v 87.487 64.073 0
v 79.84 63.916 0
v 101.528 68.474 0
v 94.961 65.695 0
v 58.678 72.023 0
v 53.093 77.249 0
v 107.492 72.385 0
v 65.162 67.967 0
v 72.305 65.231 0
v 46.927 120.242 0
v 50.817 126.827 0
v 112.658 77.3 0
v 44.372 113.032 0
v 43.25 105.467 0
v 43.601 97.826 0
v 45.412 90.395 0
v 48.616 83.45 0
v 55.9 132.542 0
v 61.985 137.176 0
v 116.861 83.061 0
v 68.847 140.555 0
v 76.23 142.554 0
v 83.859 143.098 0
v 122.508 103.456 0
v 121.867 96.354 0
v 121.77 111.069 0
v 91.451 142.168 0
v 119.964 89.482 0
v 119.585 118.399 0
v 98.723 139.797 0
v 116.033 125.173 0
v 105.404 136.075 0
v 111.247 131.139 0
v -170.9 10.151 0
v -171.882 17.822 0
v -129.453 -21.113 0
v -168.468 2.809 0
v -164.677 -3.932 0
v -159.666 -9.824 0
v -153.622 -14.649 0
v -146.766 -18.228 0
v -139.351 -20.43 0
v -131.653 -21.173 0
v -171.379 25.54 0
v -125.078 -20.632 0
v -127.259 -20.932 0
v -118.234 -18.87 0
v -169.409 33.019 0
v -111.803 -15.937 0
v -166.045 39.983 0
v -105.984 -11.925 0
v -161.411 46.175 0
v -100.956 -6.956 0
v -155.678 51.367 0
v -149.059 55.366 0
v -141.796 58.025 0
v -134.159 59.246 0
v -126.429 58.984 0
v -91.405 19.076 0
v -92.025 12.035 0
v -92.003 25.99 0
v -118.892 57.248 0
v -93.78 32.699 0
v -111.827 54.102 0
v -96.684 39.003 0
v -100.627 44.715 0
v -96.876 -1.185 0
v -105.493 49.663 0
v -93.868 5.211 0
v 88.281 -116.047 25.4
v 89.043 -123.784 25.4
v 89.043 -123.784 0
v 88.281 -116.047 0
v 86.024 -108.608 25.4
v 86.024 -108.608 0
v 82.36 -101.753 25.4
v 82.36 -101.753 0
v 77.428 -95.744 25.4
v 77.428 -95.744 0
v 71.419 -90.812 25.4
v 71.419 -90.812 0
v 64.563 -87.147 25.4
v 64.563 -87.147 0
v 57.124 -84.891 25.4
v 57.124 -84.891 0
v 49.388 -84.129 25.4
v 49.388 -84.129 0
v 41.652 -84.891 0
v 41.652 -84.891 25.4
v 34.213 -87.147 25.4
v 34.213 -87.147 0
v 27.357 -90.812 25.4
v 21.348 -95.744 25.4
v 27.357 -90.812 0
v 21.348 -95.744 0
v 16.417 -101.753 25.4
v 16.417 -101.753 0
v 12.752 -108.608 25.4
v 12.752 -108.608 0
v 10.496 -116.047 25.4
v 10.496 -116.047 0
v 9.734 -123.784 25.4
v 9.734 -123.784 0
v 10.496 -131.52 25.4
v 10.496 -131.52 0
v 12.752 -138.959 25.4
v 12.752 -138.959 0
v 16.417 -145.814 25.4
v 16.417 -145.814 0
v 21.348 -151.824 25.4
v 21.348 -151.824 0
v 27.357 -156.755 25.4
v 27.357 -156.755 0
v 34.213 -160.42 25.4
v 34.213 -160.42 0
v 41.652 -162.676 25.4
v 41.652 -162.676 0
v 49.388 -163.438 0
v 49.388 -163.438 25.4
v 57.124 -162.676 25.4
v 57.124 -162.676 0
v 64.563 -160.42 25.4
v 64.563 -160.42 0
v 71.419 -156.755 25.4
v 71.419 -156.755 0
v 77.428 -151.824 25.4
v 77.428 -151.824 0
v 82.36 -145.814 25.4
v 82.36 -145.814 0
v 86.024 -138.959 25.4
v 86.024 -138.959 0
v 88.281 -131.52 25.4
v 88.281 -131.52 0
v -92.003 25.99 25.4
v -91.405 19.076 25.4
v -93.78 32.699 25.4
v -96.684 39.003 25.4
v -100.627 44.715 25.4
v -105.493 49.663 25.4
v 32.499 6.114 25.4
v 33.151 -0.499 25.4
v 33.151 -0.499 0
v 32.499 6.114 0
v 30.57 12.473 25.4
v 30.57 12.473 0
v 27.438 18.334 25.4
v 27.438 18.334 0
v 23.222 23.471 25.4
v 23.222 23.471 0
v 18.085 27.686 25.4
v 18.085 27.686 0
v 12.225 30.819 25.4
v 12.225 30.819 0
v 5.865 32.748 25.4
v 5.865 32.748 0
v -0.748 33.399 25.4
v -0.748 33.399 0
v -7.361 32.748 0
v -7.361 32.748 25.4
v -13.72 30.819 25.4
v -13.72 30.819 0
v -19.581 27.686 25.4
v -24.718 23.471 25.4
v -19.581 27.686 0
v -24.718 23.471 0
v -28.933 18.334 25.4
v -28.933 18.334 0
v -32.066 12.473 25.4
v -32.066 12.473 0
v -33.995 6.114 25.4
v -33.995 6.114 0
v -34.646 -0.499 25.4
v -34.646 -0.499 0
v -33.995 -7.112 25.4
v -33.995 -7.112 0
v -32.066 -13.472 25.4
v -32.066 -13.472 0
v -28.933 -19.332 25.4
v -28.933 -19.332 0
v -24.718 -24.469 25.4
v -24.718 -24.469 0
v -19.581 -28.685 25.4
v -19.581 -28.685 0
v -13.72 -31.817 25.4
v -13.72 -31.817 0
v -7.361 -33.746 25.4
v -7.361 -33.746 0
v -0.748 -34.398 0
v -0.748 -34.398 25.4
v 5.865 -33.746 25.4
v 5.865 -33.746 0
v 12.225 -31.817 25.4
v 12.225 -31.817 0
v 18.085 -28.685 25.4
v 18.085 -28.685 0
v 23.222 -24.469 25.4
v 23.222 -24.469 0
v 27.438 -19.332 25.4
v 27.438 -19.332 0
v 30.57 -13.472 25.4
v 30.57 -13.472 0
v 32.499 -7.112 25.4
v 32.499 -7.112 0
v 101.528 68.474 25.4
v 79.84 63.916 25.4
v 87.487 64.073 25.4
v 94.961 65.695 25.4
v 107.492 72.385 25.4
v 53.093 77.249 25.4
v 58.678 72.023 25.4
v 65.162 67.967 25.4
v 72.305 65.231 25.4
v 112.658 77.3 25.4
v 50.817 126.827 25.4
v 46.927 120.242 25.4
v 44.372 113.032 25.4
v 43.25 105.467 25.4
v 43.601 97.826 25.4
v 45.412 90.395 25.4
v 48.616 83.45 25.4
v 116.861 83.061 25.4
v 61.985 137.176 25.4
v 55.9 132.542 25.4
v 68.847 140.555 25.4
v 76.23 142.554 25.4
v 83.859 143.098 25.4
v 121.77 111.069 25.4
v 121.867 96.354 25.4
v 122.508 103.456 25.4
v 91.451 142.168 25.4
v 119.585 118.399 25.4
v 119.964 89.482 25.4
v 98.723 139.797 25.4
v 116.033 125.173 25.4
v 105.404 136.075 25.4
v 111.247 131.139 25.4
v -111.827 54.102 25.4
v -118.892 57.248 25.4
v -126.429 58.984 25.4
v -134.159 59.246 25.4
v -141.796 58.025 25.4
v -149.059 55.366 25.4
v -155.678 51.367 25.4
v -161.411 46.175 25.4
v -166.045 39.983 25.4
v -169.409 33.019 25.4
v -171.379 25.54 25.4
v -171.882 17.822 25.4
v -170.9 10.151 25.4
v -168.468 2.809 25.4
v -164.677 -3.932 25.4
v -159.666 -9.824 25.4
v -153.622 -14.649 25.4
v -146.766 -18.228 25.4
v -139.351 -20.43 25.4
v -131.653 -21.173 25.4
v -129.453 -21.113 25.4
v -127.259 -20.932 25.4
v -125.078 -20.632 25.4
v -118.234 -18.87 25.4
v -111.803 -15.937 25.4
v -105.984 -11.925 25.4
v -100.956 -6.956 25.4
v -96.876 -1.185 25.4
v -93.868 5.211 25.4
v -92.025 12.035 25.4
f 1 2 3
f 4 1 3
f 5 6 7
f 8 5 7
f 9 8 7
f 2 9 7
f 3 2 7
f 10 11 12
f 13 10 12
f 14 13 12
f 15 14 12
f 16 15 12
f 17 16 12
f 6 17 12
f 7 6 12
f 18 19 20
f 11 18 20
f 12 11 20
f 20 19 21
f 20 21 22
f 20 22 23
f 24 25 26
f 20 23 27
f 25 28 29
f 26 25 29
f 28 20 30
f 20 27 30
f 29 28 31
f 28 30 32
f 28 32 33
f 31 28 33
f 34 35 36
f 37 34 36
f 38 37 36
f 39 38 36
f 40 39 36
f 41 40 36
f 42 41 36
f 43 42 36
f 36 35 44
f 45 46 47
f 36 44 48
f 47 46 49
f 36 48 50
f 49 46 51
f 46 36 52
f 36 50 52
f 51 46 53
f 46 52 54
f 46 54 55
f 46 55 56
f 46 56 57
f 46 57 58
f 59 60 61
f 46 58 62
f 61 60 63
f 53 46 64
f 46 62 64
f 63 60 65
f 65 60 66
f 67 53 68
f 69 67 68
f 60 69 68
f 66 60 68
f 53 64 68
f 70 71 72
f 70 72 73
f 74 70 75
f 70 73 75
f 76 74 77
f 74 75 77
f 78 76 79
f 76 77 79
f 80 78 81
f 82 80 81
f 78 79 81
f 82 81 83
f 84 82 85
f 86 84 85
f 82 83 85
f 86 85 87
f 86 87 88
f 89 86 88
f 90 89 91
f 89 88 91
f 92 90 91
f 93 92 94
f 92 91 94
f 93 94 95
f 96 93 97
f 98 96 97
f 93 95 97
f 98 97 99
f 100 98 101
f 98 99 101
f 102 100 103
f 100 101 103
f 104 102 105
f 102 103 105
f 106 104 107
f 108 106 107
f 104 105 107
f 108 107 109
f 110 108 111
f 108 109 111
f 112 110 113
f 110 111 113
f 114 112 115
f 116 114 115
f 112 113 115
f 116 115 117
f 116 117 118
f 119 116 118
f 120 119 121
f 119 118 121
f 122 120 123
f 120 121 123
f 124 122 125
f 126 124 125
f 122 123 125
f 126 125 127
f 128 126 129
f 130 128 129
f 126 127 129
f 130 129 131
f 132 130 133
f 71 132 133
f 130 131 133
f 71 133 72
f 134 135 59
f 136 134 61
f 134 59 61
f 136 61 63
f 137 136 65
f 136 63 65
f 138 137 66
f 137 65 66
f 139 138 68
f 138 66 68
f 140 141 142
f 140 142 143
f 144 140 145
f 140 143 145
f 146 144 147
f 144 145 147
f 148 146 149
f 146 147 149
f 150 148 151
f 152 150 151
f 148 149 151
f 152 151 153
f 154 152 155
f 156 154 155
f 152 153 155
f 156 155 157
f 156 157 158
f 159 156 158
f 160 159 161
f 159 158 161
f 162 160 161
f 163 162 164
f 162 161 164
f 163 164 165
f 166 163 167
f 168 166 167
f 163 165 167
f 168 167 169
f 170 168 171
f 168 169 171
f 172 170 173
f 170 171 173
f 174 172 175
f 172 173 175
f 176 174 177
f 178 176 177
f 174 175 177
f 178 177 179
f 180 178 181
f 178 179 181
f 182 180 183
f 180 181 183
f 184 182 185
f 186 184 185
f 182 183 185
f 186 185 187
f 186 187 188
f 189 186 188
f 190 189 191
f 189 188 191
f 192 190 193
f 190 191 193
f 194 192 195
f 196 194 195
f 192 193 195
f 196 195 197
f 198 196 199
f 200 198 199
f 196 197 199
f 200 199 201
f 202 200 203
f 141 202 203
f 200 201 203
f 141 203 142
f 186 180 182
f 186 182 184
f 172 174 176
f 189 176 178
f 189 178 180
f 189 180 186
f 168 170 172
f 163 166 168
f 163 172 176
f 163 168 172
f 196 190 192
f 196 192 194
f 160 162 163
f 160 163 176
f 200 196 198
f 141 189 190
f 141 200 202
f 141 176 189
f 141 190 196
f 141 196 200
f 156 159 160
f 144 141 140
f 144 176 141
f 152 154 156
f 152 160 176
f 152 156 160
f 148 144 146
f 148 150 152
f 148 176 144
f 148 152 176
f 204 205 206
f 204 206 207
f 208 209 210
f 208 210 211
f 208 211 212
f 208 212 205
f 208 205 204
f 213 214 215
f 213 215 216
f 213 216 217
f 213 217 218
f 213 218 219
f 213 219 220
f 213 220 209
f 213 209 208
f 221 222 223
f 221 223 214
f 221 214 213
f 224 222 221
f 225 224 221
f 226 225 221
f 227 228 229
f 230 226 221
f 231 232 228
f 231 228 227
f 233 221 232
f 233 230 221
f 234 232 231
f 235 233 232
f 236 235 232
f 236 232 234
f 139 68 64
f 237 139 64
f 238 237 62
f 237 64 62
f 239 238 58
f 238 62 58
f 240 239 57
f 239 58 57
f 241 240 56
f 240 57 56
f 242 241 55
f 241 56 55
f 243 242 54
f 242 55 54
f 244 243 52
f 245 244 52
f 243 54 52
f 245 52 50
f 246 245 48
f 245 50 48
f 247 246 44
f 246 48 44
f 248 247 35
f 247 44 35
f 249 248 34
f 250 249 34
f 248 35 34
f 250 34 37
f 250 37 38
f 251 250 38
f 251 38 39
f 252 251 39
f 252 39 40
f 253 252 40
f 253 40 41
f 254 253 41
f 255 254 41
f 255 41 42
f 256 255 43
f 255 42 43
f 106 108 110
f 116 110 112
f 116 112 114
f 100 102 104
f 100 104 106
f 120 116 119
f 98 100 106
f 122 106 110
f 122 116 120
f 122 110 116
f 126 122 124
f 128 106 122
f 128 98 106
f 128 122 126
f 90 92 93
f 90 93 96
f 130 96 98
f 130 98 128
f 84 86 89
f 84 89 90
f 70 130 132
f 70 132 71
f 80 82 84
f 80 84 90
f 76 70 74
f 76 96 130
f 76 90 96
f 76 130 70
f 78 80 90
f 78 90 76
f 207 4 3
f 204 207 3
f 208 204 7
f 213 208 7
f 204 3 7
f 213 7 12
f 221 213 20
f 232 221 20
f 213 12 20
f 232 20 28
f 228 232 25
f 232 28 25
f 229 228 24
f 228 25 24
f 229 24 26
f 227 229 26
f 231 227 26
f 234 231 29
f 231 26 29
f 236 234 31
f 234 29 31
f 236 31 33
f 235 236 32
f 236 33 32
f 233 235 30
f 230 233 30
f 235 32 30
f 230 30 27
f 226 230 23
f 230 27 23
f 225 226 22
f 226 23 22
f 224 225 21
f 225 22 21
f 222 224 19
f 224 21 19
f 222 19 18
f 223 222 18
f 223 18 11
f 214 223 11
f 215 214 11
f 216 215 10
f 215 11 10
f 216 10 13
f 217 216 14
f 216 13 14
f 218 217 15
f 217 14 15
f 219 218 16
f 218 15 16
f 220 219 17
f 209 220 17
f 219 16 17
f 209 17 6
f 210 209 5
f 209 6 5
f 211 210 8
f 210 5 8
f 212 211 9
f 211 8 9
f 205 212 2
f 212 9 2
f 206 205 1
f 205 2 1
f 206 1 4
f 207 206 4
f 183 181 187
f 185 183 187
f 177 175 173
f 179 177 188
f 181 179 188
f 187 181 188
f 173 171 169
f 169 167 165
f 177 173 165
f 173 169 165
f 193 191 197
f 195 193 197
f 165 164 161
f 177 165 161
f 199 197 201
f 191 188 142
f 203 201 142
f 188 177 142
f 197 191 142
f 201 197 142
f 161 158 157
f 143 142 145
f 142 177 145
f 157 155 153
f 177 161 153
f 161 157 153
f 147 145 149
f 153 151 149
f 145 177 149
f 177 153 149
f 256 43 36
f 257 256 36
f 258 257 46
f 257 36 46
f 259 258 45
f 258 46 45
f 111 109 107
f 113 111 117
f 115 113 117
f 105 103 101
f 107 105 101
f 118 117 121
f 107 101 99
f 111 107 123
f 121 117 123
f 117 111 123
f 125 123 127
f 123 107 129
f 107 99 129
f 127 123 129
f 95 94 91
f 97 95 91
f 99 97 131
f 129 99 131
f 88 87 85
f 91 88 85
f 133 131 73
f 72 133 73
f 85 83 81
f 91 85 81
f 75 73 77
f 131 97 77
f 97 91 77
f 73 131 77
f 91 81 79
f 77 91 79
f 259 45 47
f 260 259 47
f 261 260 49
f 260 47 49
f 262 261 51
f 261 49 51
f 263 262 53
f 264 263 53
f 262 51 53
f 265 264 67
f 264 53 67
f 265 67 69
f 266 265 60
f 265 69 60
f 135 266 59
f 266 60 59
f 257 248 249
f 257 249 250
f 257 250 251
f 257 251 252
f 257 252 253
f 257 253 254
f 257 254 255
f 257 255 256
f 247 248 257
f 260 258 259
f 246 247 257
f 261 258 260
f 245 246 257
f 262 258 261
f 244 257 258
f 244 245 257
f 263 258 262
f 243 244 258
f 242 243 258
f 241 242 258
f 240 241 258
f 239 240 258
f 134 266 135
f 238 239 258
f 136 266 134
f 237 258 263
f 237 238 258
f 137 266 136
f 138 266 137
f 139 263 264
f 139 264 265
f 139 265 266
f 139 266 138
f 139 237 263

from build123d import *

# Parameters (mm, degrees)
F0_R     = 33.3045819347
F1_DEPTH = 25.4
F0_R_2   = 33.8985173745


with BuildPart() as f1:
    # F0 (on Top) → F1 (new body)
    with BuildSketch(Plane.XY):
        with BuildLine():
            ThreePointArc((10.1881658678, -117.7966108428), (46.3861106689, -163.3243326291), (89.0427784966, -123.7835517983))
            ThreePointArc((89.0427784966, -123.7835517983), (52.3902824548, -84.2427709675), (10.1881658678, -117.7966108428))
        make_face()
        with Locations((49.3881965618, -123.7835517983)):
            Circle(F0_R, mode=Mode.SUBTRACT)
        with Locations((49.3881965618, -123.7835517983)):
            Circle(F0_R)
    extrude(amount=F1_DEPTH)


with BuildPart() as f1b:
    # F0 (on Top) → F1, piece 2 (new body)
    with BuildSketch(Plane.XY):
        with BuildLine():
            ThreePointArc((94.9610891571, 65.6953507789), (114.8894087237, 80.085805582), (122.5079874693, 103.4563076751))
            ThreePointArc((122.5079874693, 103.4563076751), (50.8174023454, 126.8268097682), (94.9610891571, 65.6953507789))
        make_face()
        with Locations((82.8534055346, 103.4563076751)):
            Circle(F0_R, mode=Mode.SUBTRACT)
        with Locations((82.8534055346, 103.4563076751)):
            Circle(F0_R)
    extrude(amount=F1_DEPTH)


with BuildPart() as f1c:
    # F0 (on Top) → F1, piece 3 (new body)
    with BuildSketch(Plane.XY):
        with BuildLine():
            ThreePointArc((-131.653085351, -21.1727726474), (-128.3691135331, -20.8615140587), (-125.0784078119, -20.6321482679))
            ThreePointArc((-125.0784078119, -20.6321482679), (-100.9564717429, -6.9561792095), (-91.4045679764, 19.0757447272))
            ThreePointArc((-91.4045679764, 19.0757447272), (-95.0960352936, 35.9139525283), (-105.4932977209, 49.6634654987))
            ThreePointArc((-105.4932977209, 49.6634654987), (-169.4092342659, 33.0190718037), (-131.653085351, -21.1727726474))
        make_face()
        with Locations((-131.653085351, 19.0757447272)):
            Circle(F0_R_2, mode=Mode.SUBTRACT)
        with Locations((-131.653085351, 19.0757447272)):
            Circle(F0_R_2)
        with BuildLine():
            ThreePointArc((-131.653085351, -21.1727726474), (-128.3546516521, -21.0373888575), (-125.0784078119, -20.6321482679))
            ThreePointArc((-125.0784078119, -20.6321482679), (-128.3691135331, -20.8615140587), (-131.653085351, -21.1727726474))
        make_face()
    extrude(amount=F1_DEPTH)


with BuildPart() as f1d:
    # F0 (on Top) → F1, piece 4 (new body)
    with BuildSketch(Plane.XY):
        with Locations((-0.7478448097, -0.4991076421)):
            Circle(F0_R_2)
    extrude(amount=F1_DEPTH)


solid = Compound([f1.part, f1b.part, f1c.part, f1d.part])
